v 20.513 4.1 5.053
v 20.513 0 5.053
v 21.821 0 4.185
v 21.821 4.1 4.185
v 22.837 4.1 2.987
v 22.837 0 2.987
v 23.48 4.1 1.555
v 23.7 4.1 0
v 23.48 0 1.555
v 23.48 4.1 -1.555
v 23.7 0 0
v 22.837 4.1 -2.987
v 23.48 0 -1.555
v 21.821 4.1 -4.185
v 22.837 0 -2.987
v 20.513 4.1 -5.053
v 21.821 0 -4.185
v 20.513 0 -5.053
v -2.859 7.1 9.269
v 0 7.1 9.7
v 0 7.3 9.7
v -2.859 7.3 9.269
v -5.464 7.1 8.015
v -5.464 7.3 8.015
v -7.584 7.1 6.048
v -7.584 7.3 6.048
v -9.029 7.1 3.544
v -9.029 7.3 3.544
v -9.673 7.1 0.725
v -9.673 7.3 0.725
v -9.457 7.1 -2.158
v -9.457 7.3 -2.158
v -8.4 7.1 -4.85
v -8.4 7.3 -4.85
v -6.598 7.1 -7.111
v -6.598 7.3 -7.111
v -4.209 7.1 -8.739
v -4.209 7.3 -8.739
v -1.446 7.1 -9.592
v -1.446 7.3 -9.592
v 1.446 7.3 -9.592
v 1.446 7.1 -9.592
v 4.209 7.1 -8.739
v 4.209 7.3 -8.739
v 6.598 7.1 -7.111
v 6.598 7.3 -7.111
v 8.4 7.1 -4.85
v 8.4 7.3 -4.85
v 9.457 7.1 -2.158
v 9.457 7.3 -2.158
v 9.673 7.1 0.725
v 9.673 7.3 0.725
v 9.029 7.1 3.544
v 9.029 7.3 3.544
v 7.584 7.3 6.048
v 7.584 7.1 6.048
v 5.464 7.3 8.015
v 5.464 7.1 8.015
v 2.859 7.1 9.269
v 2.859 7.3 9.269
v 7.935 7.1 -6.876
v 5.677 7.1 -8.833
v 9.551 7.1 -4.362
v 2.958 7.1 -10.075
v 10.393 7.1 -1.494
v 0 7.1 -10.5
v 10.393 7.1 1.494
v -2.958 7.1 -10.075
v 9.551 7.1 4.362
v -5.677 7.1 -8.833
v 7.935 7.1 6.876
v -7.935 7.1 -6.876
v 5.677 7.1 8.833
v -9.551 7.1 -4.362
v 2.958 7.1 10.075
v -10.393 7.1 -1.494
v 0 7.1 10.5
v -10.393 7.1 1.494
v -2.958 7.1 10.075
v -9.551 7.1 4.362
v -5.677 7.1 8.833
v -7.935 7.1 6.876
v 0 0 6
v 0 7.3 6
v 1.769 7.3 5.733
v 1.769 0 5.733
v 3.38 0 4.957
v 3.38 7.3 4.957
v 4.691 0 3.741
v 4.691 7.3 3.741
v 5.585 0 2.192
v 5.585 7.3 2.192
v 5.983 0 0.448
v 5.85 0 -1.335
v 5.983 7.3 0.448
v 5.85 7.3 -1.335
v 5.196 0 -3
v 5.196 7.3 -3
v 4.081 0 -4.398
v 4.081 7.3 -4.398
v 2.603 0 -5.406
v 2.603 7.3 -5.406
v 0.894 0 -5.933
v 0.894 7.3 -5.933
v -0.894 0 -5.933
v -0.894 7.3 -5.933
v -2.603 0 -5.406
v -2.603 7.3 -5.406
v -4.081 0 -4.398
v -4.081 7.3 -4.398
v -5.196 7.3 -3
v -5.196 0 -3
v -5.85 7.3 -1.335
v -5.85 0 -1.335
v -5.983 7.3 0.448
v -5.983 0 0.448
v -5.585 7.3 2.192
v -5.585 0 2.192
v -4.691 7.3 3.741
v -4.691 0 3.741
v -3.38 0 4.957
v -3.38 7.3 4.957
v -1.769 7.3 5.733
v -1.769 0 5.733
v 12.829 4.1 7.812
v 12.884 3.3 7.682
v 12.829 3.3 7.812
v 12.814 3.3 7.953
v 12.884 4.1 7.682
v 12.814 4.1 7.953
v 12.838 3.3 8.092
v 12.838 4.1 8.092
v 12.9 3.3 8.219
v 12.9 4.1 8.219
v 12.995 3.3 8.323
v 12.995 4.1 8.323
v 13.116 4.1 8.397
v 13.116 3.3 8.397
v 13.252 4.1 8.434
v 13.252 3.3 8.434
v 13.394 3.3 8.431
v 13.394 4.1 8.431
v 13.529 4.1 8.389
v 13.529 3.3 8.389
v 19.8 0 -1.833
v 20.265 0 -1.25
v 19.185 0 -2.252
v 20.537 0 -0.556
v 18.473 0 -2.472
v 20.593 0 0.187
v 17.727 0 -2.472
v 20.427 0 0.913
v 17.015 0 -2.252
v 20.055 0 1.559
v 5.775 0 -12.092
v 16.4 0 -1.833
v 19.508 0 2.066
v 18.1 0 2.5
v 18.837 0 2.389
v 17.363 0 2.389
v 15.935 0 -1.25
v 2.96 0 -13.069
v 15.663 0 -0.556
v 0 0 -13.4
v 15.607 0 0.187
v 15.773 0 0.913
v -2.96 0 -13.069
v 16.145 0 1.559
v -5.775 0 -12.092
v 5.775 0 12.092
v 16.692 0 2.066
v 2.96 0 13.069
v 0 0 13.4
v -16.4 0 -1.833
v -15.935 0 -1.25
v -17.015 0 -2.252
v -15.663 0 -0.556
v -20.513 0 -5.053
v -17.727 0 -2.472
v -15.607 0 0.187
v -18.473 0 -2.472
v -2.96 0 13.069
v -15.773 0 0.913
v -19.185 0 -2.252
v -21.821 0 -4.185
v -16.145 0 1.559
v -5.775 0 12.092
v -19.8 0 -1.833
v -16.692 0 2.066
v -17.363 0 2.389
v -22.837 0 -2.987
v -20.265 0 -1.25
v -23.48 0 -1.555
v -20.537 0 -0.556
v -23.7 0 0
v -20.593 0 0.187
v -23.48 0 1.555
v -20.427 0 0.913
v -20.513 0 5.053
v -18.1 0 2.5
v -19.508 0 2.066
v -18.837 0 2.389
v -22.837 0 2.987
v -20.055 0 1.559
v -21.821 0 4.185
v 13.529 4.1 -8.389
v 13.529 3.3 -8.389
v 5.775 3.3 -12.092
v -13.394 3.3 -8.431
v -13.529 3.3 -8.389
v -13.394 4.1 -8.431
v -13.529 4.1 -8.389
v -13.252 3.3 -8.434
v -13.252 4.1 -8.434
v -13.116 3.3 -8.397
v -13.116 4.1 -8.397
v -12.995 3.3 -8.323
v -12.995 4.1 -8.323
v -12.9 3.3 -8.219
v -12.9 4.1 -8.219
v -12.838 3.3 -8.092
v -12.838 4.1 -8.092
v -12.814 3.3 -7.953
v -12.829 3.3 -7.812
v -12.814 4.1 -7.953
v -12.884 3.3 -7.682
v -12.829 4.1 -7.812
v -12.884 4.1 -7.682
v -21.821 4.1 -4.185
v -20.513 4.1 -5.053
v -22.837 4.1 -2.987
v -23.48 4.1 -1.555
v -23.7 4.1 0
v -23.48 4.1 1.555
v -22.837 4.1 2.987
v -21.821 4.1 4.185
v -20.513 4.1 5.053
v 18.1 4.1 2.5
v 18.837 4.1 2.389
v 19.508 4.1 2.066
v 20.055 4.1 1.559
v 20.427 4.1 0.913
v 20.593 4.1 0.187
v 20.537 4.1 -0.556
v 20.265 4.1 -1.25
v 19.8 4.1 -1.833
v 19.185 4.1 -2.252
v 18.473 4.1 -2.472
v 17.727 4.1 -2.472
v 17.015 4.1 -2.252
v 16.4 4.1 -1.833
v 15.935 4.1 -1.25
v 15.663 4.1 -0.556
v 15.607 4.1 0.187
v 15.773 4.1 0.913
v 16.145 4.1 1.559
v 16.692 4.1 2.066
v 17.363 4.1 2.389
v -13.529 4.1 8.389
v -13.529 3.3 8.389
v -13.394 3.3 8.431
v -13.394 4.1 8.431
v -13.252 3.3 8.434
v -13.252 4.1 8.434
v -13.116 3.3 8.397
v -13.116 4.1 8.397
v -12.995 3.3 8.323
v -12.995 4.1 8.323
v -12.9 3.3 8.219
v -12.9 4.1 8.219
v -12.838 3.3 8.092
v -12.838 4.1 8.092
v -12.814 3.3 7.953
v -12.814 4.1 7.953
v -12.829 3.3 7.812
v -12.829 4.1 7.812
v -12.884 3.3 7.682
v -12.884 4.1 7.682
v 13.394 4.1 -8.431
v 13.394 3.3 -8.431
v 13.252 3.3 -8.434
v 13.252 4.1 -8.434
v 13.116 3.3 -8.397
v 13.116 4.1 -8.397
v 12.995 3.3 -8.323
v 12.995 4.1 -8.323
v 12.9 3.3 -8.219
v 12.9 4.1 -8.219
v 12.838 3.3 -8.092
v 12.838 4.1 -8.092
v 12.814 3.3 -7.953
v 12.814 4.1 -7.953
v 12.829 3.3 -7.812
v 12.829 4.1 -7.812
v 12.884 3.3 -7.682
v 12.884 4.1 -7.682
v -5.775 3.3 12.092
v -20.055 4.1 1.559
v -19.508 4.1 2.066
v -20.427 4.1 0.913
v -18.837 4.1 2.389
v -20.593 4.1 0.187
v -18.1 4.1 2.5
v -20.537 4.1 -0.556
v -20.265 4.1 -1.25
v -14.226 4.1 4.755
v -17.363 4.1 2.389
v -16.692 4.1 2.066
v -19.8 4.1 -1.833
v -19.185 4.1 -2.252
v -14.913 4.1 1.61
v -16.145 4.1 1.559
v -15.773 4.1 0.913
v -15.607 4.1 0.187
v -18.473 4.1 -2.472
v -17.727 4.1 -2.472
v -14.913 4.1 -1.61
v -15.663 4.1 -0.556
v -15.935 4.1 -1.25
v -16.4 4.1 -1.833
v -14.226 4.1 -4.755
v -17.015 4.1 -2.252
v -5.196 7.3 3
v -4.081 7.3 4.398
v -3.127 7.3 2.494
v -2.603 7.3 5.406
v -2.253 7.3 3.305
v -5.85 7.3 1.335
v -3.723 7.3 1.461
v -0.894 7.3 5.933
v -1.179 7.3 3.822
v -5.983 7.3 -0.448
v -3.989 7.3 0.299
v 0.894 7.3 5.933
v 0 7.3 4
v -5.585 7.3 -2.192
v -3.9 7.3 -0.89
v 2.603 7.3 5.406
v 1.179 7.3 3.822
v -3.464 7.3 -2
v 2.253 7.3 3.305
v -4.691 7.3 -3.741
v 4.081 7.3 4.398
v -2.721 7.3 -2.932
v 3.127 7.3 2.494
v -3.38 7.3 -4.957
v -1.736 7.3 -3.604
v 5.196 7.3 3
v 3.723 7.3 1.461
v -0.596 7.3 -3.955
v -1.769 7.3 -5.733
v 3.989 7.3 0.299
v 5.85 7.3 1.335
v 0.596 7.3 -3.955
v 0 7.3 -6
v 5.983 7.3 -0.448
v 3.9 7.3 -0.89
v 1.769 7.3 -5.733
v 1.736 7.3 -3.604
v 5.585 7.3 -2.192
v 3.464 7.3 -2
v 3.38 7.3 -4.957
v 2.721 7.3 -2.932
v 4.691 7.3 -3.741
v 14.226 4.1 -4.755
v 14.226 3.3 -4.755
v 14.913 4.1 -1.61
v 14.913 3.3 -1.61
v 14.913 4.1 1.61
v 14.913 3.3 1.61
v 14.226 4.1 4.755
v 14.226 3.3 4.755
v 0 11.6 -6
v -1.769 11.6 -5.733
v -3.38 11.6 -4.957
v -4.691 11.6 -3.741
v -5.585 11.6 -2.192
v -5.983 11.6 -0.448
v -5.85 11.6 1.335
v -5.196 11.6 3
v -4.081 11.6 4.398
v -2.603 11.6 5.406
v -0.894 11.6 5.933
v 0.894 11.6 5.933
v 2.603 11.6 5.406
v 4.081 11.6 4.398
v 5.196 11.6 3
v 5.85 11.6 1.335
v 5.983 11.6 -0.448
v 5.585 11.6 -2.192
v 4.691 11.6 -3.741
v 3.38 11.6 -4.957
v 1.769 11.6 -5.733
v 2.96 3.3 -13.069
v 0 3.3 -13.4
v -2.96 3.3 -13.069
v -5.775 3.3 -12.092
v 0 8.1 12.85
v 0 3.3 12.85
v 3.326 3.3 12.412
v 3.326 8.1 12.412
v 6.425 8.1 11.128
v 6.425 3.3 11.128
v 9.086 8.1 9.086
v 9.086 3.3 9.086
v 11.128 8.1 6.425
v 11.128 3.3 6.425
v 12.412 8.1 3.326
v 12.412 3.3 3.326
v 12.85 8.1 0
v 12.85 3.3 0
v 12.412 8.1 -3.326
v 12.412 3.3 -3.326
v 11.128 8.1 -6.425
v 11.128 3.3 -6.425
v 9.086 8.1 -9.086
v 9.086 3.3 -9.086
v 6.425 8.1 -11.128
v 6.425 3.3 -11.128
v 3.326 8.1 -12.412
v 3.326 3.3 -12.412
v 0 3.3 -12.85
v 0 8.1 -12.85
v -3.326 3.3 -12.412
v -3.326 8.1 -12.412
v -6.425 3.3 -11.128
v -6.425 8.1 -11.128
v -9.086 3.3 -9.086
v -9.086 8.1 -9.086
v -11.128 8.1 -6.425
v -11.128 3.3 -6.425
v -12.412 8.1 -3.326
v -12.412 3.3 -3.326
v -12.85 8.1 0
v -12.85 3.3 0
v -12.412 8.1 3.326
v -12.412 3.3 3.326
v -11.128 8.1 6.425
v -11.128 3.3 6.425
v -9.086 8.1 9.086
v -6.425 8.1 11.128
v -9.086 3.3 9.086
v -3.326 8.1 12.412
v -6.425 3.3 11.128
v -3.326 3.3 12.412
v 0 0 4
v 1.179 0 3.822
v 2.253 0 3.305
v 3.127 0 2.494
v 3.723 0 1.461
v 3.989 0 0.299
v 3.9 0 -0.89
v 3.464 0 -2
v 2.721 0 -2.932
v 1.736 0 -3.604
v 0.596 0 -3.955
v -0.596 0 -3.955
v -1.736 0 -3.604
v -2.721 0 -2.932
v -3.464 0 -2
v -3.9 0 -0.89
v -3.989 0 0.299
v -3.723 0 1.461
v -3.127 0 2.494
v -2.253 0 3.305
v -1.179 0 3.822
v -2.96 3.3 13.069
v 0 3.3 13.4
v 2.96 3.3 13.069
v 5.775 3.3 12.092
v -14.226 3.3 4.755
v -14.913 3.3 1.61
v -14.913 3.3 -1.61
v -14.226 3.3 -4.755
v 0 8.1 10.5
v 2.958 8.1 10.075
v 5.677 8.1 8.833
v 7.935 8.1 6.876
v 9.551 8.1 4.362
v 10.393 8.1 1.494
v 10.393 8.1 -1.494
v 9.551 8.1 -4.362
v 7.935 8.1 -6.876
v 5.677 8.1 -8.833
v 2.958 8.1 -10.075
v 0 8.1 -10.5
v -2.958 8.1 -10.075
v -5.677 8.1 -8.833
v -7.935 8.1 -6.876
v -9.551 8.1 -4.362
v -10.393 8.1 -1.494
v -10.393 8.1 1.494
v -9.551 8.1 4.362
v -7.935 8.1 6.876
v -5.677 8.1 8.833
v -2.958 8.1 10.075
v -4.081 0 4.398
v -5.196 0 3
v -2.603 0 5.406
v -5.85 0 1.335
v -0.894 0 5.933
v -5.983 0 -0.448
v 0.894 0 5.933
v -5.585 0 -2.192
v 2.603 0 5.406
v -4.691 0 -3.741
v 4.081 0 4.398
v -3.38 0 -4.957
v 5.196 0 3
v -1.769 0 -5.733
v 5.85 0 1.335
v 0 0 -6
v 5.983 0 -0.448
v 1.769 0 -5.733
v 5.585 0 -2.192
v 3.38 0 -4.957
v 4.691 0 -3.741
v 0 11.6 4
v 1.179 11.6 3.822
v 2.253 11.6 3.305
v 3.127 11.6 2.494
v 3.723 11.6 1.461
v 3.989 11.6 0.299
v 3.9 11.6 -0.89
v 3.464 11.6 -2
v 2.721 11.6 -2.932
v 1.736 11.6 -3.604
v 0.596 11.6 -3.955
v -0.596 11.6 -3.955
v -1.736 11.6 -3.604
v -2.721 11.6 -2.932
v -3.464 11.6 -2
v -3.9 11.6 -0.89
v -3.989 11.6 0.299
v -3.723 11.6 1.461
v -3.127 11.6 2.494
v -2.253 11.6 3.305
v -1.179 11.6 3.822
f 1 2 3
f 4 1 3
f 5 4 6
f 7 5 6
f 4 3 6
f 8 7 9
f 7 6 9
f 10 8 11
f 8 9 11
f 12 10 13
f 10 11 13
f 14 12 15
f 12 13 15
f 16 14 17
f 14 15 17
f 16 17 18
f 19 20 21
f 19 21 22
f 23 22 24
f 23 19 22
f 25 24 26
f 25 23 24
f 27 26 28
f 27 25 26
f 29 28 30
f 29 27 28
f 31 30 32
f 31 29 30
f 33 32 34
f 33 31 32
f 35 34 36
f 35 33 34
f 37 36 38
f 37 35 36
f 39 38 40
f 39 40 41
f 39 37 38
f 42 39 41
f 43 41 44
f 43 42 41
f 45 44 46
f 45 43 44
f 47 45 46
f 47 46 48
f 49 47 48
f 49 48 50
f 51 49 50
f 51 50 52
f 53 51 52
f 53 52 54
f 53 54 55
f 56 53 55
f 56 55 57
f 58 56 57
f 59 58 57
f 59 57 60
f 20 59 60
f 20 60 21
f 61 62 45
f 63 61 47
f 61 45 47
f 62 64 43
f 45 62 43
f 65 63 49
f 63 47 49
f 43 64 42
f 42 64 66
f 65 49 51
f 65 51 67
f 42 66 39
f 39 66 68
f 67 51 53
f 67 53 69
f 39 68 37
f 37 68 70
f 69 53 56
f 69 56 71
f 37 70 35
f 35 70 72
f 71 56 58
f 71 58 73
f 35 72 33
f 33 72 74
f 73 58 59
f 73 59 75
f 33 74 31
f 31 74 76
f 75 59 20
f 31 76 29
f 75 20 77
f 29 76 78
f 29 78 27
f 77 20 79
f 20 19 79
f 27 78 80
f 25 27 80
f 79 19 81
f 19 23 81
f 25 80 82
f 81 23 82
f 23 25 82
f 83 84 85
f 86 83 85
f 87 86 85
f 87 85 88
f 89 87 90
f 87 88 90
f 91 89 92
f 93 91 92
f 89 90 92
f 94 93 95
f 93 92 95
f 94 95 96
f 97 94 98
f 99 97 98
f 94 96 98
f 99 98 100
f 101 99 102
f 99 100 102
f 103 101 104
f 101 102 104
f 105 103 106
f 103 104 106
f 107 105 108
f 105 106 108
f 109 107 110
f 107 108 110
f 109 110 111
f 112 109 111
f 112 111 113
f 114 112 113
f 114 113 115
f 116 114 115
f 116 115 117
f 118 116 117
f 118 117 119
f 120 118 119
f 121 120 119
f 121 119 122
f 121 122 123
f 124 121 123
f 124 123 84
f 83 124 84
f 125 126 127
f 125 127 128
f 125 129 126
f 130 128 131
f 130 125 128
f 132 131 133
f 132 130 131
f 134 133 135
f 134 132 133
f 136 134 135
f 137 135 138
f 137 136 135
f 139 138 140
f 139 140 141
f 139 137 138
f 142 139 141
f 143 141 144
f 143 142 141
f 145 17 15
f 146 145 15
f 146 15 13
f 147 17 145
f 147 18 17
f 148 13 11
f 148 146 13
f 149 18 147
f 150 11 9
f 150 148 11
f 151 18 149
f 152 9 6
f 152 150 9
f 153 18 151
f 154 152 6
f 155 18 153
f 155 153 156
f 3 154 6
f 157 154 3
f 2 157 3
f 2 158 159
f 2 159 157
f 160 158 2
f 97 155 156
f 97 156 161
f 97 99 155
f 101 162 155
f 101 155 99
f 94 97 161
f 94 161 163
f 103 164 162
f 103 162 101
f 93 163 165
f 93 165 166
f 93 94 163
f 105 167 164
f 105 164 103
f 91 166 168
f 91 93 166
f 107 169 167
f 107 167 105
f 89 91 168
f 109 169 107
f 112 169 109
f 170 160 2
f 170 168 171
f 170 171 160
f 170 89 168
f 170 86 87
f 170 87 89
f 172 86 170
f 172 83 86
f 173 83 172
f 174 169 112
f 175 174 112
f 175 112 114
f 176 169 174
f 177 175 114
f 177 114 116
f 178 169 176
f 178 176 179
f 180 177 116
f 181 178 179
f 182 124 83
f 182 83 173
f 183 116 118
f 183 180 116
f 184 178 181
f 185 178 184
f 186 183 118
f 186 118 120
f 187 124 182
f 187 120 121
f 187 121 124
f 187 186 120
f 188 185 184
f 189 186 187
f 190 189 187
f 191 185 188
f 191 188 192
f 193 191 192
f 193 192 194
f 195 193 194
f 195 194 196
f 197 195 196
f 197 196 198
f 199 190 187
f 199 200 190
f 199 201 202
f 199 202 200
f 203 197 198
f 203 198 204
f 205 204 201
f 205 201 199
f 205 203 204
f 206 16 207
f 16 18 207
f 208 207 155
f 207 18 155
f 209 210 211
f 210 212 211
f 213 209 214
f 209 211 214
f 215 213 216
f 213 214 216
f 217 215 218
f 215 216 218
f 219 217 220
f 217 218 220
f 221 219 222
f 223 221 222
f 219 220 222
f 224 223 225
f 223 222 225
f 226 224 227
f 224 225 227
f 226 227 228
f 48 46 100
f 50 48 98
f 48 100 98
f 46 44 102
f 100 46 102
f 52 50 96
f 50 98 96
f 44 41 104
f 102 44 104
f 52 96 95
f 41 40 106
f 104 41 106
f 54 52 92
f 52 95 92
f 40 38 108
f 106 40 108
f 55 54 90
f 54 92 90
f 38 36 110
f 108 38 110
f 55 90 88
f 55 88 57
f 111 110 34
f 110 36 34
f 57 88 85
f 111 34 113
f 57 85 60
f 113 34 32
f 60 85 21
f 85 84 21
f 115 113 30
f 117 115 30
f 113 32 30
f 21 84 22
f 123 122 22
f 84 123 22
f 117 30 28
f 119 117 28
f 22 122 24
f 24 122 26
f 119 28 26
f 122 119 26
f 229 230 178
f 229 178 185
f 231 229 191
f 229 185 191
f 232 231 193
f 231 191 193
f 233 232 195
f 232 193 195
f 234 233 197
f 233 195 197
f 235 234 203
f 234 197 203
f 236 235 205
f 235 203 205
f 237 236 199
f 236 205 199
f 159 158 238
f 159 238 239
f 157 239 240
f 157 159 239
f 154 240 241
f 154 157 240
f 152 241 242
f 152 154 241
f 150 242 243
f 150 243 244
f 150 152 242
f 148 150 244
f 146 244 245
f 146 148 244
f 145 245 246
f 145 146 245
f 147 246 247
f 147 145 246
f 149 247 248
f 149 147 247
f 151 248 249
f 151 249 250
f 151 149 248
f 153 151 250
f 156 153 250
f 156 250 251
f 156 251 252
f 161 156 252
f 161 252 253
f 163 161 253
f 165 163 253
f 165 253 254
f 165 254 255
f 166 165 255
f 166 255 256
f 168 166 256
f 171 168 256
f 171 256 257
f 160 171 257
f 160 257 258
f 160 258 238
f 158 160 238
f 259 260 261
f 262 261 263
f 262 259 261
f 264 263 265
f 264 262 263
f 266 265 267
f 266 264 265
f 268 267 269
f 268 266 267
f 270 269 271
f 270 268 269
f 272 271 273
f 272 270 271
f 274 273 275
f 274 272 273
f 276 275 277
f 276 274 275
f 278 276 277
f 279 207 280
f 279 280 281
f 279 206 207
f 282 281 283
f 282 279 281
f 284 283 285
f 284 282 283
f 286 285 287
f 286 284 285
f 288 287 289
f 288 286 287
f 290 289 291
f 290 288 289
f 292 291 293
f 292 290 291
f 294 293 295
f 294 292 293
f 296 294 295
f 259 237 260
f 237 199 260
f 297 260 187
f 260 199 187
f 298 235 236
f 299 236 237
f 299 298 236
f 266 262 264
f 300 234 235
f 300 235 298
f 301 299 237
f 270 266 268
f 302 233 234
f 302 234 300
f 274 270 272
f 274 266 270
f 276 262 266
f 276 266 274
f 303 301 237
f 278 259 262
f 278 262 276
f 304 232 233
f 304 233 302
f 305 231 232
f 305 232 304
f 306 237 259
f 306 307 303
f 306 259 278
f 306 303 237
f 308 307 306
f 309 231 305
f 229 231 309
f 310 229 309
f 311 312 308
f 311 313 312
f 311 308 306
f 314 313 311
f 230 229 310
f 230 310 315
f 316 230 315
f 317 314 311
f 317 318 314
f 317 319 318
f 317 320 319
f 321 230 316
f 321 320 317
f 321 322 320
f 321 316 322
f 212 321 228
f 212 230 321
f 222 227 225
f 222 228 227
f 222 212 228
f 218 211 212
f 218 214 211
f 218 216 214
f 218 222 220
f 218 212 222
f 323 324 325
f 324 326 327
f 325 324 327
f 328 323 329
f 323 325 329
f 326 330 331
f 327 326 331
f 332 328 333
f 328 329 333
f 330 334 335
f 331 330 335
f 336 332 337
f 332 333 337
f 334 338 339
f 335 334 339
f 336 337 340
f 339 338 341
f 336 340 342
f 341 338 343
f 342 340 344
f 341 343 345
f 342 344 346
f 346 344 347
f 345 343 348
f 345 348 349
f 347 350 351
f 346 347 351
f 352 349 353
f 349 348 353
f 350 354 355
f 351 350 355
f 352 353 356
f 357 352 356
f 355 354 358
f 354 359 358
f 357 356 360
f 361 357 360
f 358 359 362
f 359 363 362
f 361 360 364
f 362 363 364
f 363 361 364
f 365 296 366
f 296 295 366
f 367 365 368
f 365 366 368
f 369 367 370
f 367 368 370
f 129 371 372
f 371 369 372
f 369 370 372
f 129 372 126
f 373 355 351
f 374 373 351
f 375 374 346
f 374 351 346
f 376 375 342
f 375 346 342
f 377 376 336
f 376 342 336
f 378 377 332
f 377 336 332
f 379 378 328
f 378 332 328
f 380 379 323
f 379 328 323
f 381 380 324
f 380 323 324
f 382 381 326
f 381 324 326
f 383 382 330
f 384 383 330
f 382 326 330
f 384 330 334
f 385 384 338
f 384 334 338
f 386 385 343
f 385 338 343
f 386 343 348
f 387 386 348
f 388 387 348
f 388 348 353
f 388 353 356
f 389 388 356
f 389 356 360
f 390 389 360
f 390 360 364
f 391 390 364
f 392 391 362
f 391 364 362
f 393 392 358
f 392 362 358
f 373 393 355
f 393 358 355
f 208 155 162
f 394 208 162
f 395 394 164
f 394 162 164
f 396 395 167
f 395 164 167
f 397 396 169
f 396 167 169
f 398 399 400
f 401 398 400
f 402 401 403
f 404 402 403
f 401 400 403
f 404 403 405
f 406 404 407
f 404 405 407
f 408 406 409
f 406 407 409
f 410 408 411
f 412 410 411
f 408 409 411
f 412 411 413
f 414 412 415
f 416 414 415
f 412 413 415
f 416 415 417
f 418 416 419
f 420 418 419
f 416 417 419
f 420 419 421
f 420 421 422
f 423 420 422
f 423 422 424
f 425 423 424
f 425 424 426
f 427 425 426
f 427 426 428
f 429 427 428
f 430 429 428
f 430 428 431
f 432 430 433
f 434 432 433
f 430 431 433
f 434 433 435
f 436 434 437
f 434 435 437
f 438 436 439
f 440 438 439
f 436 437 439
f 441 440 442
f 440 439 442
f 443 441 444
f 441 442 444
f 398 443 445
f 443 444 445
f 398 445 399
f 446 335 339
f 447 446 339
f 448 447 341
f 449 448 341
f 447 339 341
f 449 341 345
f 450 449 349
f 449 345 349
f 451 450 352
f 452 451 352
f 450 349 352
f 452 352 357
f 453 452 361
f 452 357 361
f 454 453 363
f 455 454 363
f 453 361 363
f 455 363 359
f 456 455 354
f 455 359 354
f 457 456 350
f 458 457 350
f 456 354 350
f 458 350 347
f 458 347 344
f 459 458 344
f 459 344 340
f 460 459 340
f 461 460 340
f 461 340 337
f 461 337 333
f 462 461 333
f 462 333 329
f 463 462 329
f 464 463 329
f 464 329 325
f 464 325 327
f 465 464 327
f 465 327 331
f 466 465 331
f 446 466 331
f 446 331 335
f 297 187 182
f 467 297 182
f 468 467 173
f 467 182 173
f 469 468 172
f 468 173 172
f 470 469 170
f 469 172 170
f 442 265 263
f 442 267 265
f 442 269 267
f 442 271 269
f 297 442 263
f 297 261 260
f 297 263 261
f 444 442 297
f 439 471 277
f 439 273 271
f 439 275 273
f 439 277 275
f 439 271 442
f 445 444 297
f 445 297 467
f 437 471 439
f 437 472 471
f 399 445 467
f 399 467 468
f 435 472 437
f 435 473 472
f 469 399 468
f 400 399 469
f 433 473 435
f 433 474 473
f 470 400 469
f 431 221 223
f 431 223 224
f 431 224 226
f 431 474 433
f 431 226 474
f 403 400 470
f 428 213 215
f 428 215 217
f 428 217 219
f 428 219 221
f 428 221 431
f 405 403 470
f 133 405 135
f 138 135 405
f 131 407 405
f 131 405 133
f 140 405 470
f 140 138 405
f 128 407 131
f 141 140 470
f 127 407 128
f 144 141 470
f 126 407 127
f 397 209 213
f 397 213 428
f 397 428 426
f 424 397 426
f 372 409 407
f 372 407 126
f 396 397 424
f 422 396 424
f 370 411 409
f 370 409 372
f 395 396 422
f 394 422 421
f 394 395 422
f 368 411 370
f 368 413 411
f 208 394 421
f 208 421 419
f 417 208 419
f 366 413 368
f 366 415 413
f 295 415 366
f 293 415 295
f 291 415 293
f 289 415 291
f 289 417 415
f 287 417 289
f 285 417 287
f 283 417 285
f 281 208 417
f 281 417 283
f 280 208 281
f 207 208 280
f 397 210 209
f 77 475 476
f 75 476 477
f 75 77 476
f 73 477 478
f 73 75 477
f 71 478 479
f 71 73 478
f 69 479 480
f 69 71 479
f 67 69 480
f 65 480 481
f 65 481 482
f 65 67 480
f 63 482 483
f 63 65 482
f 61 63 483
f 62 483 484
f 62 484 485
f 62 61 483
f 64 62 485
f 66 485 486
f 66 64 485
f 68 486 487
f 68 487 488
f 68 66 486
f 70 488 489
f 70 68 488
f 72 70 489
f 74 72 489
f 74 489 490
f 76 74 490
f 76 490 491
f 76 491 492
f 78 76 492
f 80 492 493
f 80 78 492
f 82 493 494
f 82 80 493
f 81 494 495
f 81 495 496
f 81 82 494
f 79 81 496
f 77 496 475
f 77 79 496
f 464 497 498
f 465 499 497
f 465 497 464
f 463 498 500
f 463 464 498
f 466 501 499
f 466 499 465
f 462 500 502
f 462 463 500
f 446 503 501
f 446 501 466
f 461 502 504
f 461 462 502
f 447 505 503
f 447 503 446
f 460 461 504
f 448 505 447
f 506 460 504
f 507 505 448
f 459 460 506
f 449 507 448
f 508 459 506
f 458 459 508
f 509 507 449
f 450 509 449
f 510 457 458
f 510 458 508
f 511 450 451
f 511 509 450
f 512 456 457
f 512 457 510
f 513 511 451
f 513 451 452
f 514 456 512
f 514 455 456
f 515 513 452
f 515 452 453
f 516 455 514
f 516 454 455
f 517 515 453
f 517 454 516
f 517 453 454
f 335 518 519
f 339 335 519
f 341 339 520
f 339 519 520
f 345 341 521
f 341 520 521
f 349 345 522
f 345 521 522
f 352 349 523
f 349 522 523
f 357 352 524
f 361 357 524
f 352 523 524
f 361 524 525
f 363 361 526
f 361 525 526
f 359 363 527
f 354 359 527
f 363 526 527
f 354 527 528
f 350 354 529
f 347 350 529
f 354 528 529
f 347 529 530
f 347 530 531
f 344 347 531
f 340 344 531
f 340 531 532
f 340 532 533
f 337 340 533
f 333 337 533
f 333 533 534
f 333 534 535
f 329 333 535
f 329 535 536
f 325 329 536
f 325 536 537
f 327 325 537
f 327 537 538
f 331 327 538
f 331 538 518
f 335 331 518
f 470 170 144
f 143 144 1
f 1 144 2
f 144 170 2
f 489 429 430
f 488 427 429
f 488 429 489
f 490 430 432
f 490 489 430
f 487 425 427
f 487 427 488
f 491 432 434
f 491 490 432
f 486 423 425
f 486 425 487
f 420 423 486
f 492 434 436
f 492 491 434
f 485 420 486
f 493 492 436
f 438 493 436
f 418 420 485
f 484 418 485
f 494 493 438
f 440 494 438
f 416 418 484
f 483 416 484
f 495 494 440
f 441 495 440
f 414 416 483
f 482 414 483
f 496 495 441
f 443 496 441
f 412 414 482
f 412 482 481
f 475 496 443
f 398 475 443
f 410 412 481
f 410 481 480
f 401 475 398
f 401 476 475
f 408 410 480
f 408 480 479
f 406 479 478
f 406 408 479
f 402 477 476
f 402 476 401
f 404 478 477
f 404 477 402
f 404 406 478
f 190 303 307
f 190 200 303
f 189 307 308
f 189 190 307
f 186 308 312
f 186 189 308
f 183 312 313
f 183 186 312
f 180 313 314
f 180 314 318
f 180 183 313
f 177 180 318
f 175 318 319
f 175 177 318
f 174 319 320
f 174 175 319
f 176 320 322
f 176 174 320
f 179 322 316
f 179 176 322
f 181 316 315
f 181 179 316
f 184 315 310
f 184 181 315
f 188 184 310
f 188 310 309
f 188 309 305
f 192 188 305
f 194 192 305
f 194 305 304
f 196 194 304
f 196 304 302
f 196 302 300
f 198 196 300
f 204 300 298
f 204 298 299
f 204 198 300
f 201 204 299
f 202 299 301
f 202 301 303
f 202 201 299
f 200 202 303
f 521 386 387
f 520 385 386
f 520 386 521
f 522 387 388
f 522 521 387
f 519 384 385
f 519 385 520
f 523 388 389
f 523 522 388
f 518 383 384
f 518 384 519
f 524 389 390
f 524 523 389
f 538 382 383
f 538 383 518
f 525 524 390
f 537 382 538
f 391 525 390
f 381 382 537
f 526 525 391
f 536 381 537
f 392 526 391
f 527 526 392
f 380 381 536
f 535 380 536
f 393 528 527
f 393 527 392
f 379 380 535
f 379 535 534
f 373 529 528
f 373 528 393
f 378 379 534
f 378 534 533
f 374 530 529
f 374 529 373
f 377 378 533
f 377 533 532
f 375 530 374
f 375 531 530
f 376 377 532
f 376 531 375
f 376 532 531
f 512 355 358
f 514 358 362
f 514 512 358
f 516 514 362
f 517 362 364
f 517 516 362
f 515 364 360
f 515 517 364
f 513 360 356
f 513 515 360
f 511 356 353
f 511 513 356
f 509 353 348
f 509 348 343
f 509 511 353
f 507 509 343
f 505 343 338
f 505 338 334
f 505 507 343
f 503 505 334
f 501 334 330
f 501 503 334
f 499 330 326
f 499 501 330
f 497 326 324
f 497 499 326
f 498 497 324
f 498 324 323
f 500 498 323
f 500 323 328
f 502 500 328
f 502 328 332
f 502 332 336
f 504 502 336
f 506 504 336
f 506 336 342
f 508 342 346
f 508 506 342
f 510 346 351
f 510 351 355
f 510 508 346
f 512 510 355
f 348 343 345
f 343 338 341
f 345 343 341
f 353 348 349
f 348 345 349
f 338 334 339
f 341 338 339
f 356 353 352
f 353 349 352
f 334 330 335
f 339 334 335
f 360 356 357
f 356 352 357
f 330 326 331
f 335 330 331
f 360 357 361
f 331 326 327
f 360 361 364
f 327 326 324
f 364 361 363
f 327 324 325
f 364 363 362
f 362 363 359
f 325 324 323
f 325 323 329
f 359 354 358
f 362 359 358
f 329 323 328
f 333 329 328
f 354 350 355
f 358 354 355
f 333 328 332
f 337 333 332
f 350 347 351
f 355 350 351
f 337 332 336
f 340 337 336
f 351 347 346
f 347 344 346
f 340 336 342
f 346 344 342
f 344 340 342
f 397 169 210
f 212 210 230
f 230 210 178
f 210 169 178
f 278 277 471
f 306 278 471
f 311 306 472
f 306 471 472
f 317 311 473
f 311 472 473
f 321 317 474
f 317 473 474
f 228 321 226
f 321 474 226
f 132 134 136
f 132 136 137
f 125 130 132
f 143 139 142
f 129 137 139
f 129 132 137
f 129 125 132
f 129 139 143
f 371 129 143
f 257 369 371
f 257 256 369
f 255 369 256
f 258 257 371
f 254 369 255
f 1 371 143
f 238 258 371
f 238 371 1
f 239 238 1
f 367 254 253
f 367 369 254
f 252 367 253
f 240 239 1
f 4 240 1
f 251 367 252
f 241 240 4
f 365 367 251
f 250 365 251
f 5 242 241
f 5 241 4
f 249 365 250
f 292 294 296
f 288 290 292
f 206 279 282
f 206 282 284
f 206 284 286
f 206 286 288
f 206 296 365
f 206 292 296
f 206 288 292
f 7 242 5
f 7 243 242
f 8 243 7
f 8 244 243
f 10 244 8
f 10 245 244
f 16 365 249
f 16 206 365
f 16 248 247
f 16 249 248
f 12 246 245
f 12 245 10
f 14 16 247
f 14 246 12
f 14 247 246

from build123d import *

# Parameters (mm, degrees)
SKETCH1_R            = 10.5
SKETCH1_R_2          = 2.500000000000003
SKETCH1_R_3          = 2.499999999999997
BOSS_EXTRUDE2_DEPTH  = 3.3
SKETCH2_R            = 2.4999999999999982
SKETCH2_R_2          = 2.500000000000002
BOSS_EXTRUDE3_DEPTH  = 0.8
FILLET1_R            = 0.5
SKETCH3_R            = 12.85
SKETCH3_R_2          = 10.5
BOSS_EXTRUDE4_DEPTH  = 4.8
SKETCH4_R            = 10.5
SKETCH4_R_2          = 9.700000000000001
BOSS_EXTRUDE5_DEPTH  = 7.1
SKETCH6_R            = 9.700000000000001
BOSS_EXTRUDE7_DEPTH  = 7.3
SKETCH7_R            = 6
CUT_EXTRUDE1_DEPTH   = 26.800000000000004
SKETCH8_R            = 6
BOSS_EXTRUDE8_DEPTH  = 7.3
SKETCH9_R            = 6.000000000000001
BOSS_EXTRUDE10_DEPTH = 4.3
SKETCH10_R           = 4
CUT_EXTRUDE2_DEPTH   = 25.300000000000004


with BuildPart() as part:
    # Sketch1 → Boss-Extrude2 (new body)
    with BuildSketch(Plane(origin=(0, 0, 0), x_dir=(1, 0, 0), z_dir=(0, 1, 0))):
        with BuildLine():
            ThreePointArc((20.513259668508287, -5.053333332796404), (23.699999999999996, 2e-15), (20.513259668508287, 5.05333333279641))
            Line((20.513259668508287, 5.053333332796416), (5.774585635359114, 12.091904760619984))
            ThreePointArc((5.774585635359115, 12.091904760619984), (-3.55e-15, 13.400000000000004), (-5.77458563535912, 12.09190476061998))
            Line((-5.774585635359118, 12.091904760619979), (-20.513259668508287, 5.053333332796407))
            ThreePointArc((-20.513259668508287, 5.053333332796408), (-23.699999999999996, 3.8e-16), (-20.51325966850829, -5.053333332796407))
            Line((-20.513259668508287, -5.053333332796406), (-5.7745856353591165, -12.091904760619977))
            ThreePointArc((-5.774585635359118, -12.091904760619983), (1.78e-15, -13.400000000000002), (5.774585635359122, -12.09190476061998))
            Line((5.77458563535912, -12.09190476061998), (20.51325966850829, -5.053333332796409))
        make_face()
        with Locations(Location((0, -4.4e-16, 0), (0, 0, 270))):
            Circle(SKETCH1_R, mode=Mode.SUBTRACT)
        with Locations(Location((18.1, 1.67e-15, 0), (0, 0, 270))):
            Circle(SKETCH1_R_2, mode=Mode.SUBTRACT)
        with Locations(Location((-18.099999999999994, -1.78e-15, 0), (0, 0, 270))):
            Circle(SKETCH1_R_3, mode=Mode.SUBTRACT)
    extrude(amount=BOSS_EXTRUDE2_DEPTH)

    # Sketch2 → Boss-Extrude3 (add)
    # profile 1 of 6: a face of its own
    with BuildSketch(Plane(origin=(0, 3.3, 0), x_dir=(1, 0, 0), z_dir=(0, 1, 0))):
        with BuildLine():
            Line((-11.857463280491546, 9.186977987989012), (-20.513259668508283, 5.053333332796408))
            ThreePointArc((-20.513259668508287, 5.053333332796406), (-17.32844759430292, 5.546594169872447), (-14.399171270718146, 4.202840315372693))
            ThreePointArc((-14.399171270718254, 4.202840315372694), (-13.36275127261764, 6.814460978401421), (-11.857463280491544, 9.186977987989017))
        make_face()
    # profile 2 of 6: a face of its own
    with BuildSketch(Plane(origin=(0, 3.3, 0), x_dir=(1, 0, 0), z_dir=(0, 1, 0))):
        with BuildLine():
            ThreePointArc((-14.399171270718146, 4.202840315372693), (-17.32844759430292, 5.546594169872447), (-20.513259668508287, 5.053333332796406))
            ThreePointArc((-20.513259668508287, 5.053333332796406), (-23.699999999999996, 3.8e-16), (-20.513259668508287, -5.053333332796405))
            ThreePointArc((-20.513259668508287, -5.053333332796405), (-17.328447594302915, -5.546594169872446), (-14.399171270718144, -4.2028403153726925))
            ThreePointArc((-14.399171270718258, -4.202840315372684), (-15, 1.84e-15), (-14.399171270718254, 4.202840315372694))
        make_face()
        with Locations(Location((-18.099999999999998, -3.1e-16, 0), (0, 0, 270))):
            Circle(SKETCH2_R, mode=Mode.SUBTRACT)
    # profile 3 of 6: a face of its own
    with BuildSketch(Plane(origin=(0, 3.3, 0), x_dir=(1, 0, 0), z_dir=(0, 1, 0))):
        with BuildLine():
            ThreePointArc((-14.399171270718144, -4.2028403153726925), (-17.328447594302915, -5.546594169872446), (-20.513259668508287, -5.053333332796405))
            Line((-20.513259668508283, -5.053333332796404), (-11.857463280491546, -9.186977987989014))
            ThreePointArc((-11.857463280491546, -9.186977987989014), (-13.362751272617642, -6.814460978401417), (-14.399171270718258, -4.202840315372684))
        make_face()
    # profile 4 of 6: a face of its own
    with BuildSketch(Plane(origin=(0, 3.3, 0), x_dir=(1, 0, 0), z_dir=(0, 1, 0))):
        with BuildLine():
            ThreePointArc((14.399171270718256, -4.202840315372689), (13.362751272617636, -6.814460978401428), (11.857463280491539, -9.186977987989023))
            Line((11.857463280491542, -9.186977987989021), (20.51325966850829, -5.053333332796405))
            ThreePointArc((20.513259668508294, -5.053333332796405), (17.32844759430292, -5.5465941698724475), (14.39917127071814, -4.202840315372691))
        make_face()
    # profile 5 of 6: a face of its own
    with BuildSketch(Plane(origin=(0, 3.3, 0), x_dir=(1, 0, 0), z_dir=(0, 1, 0))):
        with BuildLine():
            Line((20.513259668508287, 5.053333332796412), (11.857463280491546, 9.18697798798902))
            ThreePointArc((11.857463280491544, 9.186977987989017), (13.36275127261764, 6.814460978401421), (14.399171270718254, 4.202840315372695))
            ThreePointArc((14.399171270718142, 4.202840315372697), (17.328447594302915, 5.546594169872453), (20.51325966850829, 5.05333333279641))
        make_face()
    # profile 6 of 6: a face of its own
    with BuildSketch(Plane(origin=(0, 3.3, 0), x_dir=(1, 0, 0), z_dir=(0, 1, 0))):
        with BuildLine():
            ThreePointArc((23.7, 2.87e-15), (22.83678446541778, 2.987117829643953), (20.51325966850829, 5.05333333279641))
            ThreePointArc((20.51325966850829, 5.05333333279641), (17.328447594302915, 5.546594169872453), (14.399171270718142, 4.202840315372697))
            ThreePointArc((14.399171270718254, 4.202840315372695), (14.849033117694463, 2.1227848382756775), (15, 0))
            ThreePointArc((15, -3.67e-15), (14.849033117694463, -2.122784838275676), (14.399171270718256, -4.202840315372689))
            ThreePointArc((14.39917127071814, -4.202840315372691), (17.32844759430292, -5.5465941698724475), (20.513259668508294, -5.053333332796405))
            ThreePointArc((20.513259668508294, -5.053333332796405), (22.83678446541778, -2.9871178296439473), (23.7, 1.49e-15))
        make_face()
        with Locations(Location((18.099999999999998, 2.87e-15, 0), (0, 0, 270))):
            Circle(SKETCH2_R_2, mode=Mode.SUBTRACT)
    extrude(amount=BOSS_EXTRUDE3_DEPTH)

    # Fillet1
    fillet1_edges = [part.edges().sort_by_distance(p)[0] for p in [
        (-11.857463280491544, 3.6999999999999997, -9.186977987989016),
        (-11.857463280491547, 3.6999999999999997, 9.186977987989014),
        (11.85746328049154, 3.6999999999999997, 9.186977987989021),
        (11.857463280491544, 3.6999999999999997, -9.186977987989017),
    ]]
    fillet(fillet1_edges, radius=FILLET1_R)

    # Sketch3 → Boss-Extrude4 (add)
    with BuildSketch(Plane(origin=(0, 3.3, 0), x_dir=(1, 0, 0), z_dir=(0, 1, 0))):
        with Locations(Location((0, 0, 0), (0, 0, 270))):
            Circle(SKETCH3_R)
        with Locations(Location((0, 0, 0), (0, 0, 270))):
            Circle(SKETCH3_R_2, mode=Mode.SUBTRACT)
    extrude(amount=BOSS_EXTRUDE4_DEPTH)

    # Sketch4 → Boss-Extrude5 (add)
    with BuildSketch(Plane.XZ):
        with Locations(Location((0, 0, 0), (0, 0, 90))):
            Circle(SKETCH4_R)
        with Locations(Location((0, 0, 0), (0, 0, 270))):
            Circle(SKETCH4_R_2, mode=Mode.SUBTRACT)
    extrude(amount=-BOSS_EXTRUDE5_DEPTH)

    # Sketch6 → Boss-Extrude7 (add)
    with BuildSketch(Plane.XZ):
        with Locations(Location((0, 0, 0), (0, 0, 90))):
            Circle(SKETCH6_R)
    extrude(amount=-BOSS_EXTRUDE7_DEPTH)

    # Sketch7 → Cut-Extrude1 (cut)
    with BuildSketch(Plane(origin=(0, 7.299999999999999, 0), x_dir=(1, 0, 0), z_dir=(0, 1, 0))):
        with Locations(Location((0, 0, 0), (0, 0, 270))):
            Circle(SKETCH7_R)
    extrude(amount=-CUT_EXTRUDE1_DEPTH, mode=Mode.SUBTRACT)


with BuildPart() as body_2:
    # Sketch8 → Boss-Extrude8 (new body)
    with BuildSketch(Plane.XZ):
        with Locations(Location((0, 0, 0), (0, 0, 270))):
            Circle(SKETCH8_R)
    extrude(amount=-BOSS_EXTRUDE8_DEPTH)


with BuildPart() as body_3:
    # Sketch9 → Boss-Extrude10 (new body)
    with BuildSketch(Plane(origin=(0, 7.299999999999999, 0), x_dir=(1, 0, 0), z_dir=(0, 1, 0))):
        with Locations(Location((0, 0, 0), (0, 0, 90))):
            Circle(SKETCH9_R)
    extrude(amount=BOSS_EXTRUDE10_DEPTH)


with BuildPart() as cut_extrude2_tool:
    # Sketch10 → Cut-Extrude2 (new body)
    with BuildSketch(Plane(origin=(0, 11.6, 0), x_dir=(1, 0, 0), z_dir=(0, 1, 0))):
        with Locations(Location((0, 0, 0), (0, 0, 270))):
            Circle(SKETCH10_R)
    extrude(amount=-CUT_EXTRUDE2_DEPTH)


with BuildPart() as body_2_1:
    add(body_2.part)

    # Cut-Extrude2: cut by cut_extrude2_tool
    add(cut_extrude2_tool.part, mode=Mode.SUBTRACT)


with BuildPart() as body_3_1:
    add(body_3.part)

    # Cut-Extrude2: cut by cut_extrude2_tool
    add(cut_extrude2_tool.part, mode=Mode.SUBTRACT)


solid = Compound([part.part, body_2_1.part, body_3_1.part])
